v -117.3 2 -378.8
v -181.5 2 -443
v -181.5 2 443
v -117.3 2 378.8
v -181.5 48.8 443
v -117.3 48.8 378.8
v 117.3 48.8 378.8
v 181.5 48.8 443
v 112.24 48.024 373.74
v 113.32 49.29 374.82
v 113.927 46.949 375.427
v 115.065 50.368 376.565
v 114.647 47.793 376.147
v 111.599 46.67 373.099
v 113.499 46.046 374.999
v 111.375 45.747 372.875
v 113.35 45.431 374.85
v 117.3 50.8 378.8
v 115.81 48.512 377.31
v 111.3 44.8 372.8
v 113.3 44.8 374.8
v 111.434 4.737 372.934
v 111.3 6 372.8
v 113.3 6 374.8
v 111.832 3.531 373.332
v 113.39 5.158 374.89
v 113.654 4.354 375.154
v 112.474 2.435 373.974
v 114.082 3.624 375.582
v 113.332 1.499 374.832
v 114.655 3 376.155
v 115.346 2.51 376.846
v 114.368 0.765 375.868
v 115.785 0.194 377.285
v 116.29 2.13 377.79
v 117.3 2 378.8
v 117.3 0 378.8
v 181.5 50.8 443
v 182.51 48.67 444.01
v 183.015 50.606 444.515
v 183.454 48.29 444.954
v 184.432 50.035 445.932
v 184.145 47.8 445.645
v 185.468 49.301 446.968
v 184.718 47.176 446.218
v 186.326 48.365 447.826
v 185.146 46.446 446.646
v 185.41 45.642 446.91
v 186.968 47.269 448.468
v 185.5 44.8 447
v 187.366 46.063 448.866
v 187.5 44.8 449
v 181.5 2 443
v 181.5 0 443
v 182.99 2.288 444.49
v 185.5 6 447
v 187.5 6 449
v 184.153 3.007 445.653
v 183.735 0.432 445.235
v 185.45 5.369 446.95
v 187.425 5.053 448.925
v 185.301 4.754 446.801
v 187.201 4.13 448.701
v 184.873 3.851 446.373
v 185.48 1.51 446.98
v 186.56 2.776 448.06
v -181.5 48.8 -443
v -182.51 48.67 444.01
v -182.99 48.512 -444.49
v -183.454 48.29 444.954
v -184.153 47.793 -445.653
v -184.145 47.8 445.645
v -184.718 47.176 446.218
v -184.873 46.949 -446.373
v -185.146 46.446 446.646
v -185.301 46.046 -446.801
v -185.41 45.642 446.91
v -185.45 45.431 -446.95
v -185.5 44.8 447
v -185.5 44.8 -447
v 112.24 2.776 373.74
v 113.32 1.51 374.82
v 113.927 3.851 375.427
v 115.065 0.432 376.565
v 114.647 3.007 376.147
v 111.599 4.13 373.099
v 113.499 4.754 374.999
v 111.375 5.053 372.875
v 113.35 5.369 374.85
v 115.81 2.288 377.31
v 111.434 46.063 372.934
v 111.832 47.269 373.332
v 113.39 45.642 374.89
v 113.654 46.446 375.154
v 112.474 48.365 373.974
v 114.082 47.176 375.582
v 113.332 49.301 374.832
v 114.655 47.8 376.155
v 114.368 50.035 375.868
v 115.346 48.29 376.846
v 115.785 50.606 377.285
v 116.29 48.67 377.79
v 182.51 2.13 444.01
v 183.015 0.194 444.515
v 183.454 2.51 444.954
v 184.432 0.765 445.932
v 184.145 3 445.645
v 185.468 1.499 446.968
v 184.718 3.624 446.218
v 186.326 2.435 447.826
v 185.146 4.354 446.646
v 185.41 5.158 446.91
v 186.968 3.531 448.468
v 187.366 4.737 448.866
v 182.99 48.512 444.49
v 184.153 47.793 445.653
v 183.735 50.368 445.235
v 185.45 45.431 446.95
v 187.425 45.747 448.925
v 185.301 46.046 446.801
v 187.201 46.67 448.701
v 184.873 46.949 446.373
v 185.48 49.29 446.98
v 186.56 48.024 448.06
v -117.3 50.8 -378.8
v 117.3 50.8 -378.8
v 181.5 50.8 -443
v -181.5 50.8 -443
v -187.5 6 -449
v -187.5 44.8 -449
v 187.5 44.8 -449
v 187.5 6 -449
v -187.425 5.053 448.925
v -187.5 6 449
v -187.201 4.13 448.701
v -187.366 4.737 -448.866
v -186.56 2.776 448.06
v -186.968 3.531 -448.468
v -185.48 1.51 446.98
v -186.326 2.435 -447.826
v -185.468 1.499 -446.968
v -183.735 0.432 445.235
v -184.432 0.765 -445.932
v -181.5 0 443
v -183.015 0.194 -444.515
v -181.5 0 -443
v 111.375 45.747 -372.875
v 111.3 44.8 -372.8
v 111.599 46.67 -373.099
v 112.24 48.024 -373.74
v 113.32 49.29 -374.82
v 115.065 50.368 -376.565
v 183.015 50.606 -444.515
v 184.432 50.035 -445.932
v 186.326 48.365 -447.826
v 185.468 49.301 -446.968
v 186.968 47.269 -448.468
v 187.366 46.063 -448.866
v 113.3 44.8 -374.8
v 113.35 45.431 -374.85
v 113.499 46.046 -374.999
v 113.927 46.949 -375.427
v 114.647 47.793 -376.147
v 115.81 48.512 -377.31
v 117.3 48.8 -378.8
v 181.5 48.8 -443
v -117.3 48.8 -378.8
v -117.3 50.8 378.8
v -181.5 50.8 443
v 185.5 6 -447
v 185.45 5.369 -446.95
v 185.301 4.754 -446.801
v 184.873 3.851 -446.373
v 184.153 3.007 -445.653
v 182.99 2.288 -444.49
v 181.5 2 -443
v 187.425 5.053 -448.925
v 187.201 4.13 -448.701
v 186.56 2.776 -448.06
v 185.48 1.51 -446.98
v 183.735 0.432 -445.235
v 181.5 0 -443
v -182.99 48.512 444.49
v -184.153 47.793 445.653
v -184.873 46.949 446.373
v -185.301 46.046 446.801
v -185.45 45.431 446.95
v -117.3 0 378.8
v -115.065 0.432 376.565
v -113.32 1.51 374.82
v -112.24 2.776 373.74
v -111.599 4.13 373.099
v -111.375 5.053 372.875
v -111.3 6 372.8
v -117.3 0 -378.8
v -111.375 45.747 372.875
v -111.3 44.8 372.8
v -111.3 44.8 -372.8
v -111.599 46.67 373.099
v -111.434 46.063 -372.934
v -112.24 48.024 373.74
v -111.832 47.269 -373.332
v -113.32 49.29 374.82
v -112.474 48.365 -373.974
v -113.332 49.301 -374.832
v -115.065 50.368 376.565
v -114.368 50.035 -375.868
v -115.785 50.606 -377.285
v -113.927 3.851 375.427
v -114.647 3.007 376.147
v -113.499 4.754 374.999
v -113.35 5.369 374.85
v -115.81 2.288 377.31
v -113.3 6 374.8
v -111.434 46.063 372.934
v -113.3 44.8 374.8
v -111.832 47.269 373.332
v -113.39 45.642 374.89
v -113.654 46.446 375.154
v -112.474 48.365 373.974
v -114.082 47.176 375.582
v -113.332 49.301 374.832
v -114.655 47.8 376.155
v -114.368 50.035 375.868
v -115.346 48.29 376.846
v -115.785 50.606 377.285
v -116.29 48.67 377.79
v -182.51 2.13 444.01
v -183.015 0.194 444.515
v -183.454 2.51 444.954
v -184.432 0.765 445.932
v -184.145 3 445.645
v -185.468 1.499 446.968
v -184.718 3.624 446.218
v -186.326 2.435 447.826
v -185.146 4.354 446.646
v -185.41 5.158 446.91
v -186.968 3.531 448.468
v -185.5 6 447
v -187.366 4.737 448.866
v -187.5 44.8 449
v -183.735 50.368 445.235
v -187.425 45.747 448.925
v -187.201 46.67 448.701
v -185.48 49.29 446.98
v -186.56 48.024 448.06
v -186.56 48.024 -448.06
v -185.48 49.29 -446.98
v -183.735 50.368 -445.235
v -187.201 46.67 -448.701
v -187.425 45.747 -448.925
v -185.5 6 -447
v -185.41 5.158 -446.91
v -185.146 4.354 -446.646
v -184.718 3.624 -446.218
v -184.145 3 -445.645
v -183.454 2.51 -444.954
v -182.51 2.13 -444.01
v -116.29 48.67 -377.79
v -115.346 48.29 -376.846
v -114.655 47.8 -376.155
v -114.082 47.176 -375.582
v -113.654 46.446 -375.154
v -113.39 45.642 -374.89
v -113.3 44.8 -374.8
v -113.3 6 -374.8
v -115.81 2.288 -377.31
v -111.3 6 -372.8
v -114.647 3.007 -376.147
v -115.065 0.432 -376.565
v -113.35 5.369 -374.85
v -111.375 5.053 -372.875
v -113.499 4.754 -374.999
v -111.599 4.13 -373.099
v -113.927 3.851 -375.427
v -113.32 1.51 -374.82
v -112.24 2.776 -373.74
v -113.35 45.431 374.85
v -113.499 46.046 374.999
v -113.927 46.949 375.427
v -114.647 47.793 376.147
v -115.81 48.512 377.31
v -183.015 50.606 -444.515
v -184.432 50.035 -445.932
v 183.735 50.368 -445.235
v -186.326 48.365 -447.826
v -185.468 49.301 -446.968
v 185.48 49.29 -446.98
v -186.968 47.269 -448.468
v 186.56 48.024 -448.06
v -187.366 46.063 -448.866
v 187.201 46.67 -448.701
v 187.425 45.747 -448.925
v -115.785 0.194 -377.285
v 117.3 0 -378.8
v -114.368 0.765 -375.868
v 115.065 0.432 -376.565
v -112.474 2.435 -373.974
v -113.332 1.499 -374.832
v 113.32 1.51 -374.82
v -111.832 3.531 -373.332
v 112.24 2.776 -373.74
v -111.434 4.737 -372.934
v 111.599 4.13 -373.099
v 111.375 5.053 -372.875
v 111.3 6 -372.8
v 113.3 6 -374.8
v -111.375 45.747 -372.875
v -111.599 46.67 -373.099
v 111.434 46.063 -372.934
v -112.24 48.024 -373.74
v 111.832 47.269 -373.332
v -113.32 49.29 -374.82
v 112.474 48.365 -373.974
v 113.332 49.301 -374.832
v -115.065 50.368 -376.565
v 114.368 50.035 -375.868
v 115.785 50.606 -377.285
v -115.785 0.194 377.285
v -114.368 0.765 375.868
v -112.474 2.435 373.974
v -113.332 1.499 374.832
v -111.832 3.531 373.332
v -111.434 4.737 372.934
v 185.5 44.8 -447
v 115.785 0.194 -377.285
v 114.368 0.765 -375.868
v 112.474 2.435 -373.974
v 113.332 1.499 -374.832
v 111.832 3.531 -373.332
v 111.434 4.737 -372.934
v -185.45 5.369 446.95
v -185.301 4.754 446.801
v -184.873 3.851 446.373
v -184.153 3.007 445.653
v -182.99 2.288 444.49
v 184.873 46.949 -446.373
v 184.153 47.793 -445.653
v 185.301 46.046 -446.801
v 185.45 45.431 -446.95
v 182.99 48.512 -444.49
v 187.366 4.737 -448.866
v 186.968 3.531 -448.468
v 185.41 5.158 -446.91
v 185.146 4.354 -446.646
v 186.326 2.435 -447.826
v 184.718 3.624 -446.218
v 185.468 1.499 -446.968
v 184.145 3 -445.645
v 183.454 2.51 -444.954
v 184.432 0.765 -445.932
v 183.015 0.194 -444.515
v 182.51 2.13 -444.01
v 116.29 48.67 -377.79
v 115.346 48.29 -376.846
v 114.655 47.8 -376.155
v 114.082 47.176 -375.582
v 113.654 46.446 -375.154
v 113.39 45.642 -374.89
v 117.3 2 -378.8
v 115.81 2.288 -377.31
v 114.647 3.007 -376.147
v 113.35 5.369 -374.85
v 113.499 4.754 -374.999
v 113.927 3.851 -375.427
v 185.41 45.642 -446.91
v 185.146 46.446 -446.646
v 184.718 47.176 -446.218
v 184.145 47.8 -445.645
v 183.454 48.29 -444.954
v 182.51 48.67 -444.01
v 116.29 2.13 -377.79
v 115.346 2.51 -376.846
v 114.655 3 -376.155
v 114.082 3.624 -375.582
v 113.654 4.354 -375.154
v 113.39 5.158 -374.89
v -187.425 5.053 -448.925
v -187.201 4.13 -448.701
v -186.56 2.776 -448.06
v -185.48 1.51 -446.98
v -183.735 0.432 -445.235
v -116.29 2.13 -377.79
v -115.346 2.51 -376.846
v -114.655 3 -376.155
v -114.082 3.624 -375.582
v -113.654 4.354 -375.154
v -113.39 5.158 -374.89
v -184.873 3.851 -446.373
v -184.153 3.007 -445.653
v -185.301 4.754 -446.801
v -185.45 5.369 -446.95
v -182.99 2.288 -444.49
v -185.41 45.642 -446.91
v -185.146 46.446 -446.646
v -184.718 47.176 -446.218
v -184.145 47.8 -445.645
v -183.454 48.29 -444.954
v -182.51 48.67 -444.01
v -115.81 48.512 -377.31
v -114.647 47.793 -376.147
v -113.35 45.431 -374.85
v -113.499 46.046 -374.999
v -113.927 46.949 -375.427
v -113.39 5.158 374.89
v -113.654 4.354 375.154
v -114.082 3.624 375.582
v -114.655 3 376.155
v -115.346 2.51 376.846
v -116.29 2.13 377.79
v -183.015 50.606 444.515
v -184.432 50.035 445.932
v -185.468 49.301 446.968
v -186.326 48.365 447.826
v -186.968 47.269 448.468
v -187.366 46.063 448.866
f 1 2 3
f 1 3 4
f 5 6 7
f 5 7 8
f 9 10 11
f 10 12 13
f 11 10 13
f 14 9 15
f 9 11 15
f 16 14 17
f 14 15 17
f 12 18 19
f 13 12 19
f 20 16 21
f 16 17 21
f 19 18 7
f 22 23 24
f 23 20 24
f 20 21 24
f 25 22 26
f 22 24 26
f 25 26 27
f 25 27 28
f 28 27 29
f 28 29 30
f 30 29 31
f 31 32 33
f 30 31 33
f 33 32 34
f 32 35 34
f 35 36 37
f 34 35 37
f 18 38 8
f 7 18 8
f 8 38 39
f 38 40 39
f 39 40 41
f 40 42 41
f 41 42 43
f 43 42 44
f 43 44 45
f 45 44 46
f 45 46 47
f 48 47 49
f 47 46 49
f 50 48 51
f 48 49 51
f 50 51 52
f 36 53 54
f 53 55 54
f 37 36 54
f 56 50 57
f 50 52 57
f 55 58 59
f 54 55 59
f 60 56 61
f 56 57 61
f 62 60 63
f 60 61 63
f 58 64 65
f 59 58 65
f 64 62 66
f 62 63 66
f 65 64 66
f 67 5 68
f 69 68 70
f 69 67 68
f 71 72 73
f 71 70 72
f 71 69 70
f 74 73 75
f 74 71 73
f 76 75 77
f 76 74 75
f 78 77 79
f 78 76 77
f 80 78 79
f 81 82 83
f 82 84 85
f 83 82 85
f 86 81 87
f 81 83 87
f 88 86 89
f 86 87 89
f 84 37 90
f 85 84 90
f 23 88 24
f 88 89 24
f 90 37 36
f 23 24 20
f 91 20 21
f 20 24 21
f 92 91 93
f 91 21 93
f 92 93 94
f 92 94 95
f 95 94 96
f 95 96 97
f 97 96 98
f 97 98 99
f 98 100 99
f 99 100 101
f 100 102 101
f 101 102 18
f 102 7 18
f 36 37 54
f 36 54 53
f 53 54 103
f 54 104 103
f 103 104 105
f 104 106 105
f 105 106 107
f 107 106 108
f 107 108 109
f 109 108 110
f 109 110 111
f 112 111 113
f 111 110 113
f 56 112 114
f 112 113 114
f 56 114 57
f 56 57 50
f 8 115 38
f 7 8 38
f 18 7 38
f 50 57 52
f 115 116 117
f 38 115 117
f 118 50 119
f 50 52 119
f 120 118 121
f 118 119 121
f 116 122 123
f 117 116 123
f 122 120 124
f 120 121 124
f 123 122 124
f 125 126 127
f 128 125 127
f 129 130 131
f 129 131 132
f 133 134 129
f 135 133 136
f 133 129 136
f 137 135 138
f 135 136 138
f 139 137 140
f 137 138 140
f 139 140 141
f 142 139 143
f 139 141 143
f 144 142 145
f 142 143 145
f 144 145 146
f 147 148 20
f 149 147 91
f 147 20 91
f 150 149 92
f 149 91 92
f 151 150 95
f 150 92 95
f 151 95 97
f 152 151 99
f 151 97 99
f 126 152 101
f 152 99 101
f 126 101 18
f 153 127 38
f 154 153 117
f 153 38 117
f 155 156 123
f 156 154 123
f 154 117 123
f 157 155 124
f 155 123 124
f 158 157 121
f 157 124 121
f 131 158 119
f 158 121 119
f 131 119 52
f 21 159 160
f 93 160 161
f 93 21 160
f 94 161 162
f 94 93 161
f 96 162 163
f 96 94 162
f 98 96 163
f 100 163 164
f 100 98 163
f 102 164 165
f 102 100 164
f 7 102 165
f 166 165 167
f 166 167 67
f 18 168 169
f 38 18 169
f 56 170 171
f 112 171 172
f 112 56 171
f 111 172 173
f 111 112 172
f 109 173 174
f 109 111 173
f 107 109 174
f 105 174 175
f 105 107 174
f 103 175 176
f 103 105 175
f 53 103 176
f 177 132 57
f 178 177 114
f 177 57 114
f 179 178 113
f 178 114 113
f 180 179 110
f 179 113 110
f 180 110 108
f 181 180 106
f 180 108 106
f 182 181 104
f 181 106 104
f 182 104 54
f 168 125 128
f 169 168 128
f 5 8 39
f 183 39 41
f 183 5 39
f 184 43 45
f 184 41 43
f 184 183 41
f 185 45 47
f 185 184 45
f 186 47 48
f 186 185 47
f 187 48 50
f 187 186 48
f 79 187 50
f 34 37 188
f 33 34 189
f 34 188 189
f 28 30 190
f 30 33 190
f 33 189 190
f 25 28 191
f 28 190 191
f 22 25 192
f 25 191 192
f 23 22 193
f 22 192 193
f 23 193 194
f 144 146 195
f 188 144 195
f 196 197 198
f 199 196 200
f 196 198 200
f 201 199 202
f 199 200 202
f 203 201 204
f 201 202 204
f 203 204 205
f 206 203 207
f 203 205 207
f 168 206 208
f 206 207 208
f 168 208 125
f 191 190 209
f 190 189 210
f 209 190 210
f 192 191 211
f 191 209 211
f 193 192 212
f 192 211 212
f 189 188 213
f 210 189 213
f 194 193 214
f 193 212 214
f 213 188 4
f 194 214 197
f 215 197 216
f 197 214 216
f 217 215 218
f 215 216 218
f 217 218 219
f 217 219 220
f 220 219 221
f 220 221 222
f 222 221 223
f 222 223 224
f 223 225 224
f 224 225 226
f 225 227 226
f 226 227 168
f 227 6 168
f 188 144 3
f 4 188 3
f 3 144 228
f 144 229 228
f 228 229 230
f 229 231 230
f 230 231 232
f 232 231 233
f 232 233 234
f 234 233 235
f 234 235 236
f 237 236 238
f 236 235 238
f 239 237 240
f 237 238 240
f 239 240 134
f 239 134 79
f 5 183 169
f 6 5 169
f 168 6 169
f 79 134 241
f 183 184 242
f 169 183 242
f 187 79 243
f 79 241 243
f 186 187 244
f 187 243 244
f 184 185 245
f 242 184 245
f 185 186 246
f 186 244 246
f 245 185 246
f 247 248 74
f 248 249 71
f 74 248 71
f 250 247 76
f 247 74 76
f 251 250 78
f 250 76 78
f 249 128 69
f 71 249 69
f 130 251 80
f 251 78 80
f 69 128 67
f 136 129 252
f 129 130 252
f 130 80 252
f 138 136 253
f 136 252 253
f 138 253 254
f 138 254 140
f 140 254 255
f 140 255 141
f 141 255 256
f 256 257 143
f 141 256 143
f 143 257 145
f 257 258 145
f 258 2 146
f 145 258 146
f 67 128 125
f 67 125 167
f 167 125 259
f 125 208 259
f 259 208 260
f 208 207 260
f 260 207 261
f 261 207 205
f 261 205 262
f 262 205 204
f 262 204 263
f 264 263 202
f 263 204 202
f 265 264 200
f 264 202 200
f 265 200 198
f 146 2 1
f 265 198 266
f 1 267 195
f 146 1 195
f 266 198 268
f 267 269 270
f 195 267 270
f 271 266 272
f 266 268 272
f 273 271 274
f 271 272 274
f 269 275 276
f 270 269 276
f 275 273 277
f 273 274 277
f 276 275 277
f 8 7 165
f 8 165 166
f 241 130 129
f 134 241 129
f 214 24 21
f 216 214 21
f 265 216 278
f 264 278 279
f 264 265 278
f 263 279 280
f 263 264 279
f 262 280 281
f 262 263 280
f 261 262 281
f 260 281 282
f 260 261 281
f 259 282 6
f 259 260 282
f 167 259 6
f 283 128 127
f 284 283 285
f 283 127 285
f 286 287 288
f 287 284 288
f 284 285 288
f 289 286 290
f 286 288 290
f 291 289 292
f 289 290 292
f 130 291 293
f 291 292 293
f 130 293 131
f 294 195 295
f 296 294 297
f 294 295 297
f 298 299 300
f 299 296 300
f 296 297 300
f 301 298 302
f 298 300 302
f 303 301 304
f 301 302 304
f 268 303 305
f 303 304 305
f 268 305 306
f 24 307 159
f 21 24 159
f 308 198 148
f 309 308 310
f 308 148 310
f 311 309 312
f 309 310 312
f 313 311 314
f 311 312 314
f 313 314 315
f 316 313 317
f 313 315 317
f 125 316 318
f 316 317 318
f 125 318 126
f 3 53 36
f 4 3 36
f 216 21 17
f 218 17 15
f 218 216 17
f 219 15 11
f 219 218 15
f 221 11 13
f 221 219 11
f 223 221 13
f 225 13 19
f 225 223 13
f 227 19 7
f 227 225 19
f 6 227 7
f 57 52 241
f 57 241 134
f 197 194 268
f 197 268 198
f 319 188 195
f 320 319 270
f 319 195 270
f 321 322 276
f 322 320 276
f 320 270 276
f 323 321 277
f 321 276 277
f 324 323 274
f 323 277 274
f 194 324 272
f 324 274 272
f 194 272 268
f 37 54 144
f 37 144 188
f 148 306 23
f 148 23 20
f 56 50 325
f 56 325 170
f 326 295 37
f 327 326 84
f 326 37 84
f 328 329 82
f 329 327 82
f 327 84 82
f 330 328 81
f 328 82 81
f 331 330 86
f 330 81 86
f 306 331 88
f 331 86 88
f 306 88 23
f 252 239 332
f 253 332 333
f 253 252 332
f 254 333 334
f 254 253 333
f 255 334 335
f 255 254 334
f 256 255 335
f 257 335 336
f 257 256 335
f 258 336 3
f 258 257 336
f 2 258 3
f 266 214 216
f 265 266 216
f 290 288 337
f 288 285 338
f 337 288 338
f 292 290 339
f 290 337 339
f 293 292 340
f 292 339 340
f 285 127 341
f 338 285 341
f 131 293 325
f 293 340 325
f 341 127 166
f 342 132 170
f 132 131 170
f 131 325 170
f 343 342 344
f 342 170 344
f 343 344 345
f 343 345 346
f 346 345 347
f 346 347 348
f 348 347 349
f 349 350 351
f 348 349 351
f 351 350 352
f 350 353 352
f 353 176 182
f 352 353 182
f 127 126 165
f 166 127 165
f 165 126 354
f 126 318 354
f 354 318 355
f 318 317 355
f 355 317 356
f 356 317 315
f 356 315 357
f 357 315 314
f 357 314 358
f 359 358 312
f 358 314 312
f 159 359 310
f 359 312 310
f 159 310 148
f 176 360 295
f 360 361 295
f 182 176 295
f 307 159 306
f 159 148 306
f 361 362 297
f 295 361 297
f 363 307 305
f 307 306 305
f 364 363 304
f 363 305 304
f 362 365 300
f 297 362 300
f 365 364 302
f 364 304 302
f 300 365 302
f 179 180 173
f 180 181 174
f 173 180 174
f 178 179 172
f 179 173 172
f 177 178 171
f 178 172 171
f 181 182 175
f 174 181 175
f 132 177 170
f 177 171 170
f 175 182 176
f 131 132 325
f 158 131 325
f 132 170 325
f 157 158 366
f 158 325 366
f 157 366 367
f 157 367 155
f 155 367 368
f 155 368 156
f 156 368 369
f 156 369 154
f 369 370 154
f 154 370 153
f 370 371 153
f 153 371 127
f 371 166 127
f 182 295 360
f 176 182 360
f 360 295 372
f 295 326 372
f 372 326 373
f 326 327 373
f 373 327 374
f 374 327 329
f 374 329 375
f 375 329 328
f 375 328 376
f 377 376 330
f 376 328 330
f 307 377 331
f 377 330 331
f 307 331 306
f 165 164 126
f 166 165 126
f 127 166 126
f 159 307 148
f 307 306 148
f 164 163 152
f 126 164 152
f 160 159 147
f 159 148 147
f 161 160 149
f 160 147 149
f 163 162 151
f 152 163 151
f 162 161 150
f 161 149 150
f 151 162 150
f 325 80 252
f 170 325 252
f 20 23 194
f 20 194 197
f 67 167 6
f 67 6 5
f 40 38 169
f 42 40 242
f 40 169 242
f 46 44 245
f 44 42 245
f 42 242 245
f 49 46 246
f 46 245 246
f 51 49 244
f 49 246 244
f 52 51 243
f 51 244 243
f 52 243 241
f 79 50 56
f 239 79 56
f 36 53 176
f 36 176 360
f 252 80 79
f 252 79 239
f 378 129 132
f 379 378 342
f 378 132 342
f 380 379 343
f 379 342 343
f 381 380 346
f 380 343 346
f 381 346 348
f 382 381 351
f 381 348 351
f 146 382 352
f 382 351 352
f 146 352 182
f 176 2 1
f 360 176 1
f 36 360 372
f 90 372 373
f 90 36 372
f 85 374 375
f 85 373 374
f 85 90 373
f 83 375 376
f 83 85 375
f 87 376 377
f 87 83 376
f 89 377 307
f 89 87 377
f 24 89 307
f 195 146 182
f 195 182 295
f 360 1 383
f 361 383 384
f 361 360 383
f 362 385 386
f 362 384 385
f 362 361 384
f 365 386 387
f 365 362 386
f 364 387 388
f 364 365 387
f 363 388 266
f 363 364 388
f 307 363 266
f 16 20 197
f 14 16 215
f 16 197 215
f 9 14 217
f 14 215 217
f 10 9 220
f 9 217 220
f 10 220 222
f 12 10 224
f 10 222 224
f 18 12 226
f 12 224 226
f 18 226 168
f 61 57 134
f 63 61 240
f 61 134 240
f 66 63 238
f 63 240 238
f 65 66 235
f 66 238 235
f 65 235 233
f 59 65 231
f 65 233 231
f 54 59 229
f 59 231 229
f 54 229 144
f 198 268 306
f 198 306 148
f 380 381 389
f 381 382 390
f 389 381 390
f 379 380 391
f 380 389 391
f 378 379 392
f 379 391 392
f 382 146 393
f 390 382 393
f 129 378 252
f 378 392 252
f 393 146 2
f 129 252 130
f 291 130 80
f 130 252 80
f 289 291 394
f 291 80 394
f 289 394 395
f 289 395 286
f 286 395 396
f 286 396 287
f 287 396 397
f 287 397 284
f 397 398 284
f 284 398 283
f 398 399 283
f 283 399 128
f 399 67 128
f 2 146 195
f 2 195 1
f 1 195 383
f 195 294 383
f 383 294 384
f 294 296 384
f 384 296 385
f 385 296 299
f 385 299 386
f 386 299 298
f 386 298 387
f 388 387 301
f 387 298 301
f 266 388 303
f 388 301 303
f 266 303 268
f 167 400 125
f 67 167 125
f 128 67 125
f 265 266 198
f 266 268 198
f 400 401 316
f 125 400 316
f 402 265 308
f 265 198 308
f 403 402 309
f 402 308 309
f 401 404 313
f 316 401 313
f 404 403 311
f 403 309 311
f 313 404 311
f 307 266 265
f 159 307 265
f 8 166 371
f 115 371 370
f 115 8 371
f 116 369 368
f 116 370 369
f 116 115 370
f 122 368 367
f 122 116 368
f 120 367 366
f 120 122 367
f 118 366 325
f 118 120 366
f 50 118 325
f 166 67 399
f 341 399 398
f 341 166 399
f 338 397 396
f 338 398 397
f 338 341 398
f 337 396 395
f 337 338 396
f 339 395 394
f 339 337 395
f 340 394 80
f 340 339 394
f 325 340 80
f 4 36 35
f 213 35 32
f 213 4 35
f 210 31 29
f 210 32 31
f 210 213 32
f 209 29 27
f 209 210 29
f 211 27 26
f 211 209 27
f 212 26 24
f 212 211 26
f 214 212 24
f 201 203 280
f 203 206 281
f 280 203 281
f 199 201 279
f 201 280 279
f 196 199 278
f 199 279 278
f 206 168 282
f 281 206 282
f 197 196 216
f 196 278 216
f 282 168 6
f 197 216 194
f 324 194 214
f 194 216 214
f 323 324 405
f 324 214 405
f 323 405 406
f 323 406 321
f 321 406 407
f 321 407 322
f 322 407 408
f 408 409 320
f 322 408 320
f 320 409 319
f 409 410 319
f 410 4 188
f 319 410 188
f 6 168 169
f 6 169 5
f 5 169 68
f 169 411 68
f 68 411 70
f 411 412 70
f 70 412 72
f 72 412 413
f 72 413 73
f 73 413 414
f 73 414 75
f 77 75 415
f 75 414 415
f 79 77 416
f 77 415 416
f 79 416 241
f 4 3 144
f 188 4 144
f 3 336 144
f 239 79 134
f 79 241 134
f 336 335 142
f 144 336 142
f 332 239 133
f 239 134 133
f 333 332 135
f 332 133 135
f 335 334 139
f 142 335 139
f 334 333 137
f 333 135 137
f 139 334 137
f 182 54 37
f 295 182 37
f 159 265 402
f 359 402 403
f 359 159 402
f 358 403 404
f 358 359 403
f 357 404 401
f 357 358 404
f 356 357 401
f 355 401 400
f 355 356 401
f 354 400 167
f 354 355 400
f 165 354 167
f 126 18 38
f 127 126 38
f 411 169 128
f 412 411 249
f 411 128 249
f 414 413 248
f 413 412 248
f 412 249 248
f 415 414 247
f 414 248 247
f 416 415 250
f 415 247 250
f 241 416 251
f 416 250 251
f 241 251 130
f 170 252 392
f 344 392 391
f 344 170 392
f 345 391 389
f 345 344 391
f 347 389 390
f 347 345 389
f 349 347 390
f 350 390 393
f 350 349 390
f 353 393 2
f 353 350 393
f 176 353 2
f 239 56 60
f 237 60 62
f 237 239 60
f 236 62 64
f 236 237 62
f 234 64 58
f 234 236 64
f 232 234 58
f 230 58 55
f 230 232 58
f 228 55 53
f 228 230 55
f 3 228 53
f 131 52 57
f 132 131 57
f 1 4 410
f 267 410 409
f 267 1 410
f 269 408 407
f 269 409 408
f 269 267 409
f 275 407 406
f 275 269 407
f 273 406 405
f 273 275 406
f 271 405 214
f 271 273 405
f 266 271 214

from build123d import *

# Parameters (mm, degrees)
TUBO_RECTANGULAR_3_X_2_X_0_25_1_DEPTH      = 990.581002397
TUBO_RECTANGULAR_3_X_2_X_0_25_1_DEPTH_BACK = 92.581002397
TUBO_RECTANGULAR_3_X_2_X_0_25_1_2_DEPTH    = 560.162004794
TUBO_RECTANGULAR_3_X_2_X_0_25_1_3_DEPTH    = 1083.162004794
TUBO_RECTANGULAR_3_X_2_X_0_25_1_4_DEPTH    = 560.162004794


with BuildPart() as part:
    # Sketch1 → Tubo rectangular 3 X 2 X 0.25(1) (new, two sides: drawn at the far end of the back side and taken through both)
    with BuildSketch(Plane(origin=(-149.4, 25.4, -449), x_dir=(1, 0, 0), z_dir=(0, 0, 1)).offset(-TUBO_RECTANGULAR_3_X_2_X_0_25_1_DEPTH_BACK)):
        with BuildLine():
            Line((-32.1, -25.4), (32.1, -25.4))
            ThreePointArc((32.1, -25.4), (36.342640687, -23.642640687), (38.1, -19.4))
            Line((38.1, -19.4), (38.1, 19.4))
            ThreePointArc((38.1, 19.4), (36.342640687, 23.642640687), (32.1, 25.4))
            Line((32.1, 25.4), (-32.1, 25.4))
            ThreePointArc((-32.1, 25.4), (-36.342640687, 23.642640687), (-38.1, 19.4))
            Line((-38.1, 19.4), (-38.1, -19.4))
            ThreePointArc((-38.1, -19.4), (-36.342640687, -23.642640687), (-32.1, -25.4))
        make_face()
        with BuildLine():
            Line((-32.1, -23.4), (32.1, -23.4))
            ThreePointArc((32.1, -23.4), (34.928427125, -22.228427125), (36.1, -19.4))
            Line((36.1, -19.4), (36.1, 19.4))
            ThreePointArc((36.1, 19.4), (34.928427125, 22.228427125), (32.1, 23.4))
            Line((32.1, 23.4), (-32.1, 23.4))
            ThreePointArc((-32.1, 23.4), (-34.928427125, 22.228427125), (-36.1, 19.4))
            Line((-36.1, 19.4), (-36.1, -19.4))
            ThreePointArc((-36.1, -19.4), (-34.928427125, -22.228427125), (-32.1, -23.4))
        make_face(mode=Mode.SUBTRACT)
    extrude(amount=TUBO_RECTANGULAR_3_X_2_X_0_25_1_DEPTH + TUBO_RECTANGULAR_3_X_2_X_0_25_1_DEPTH_BACK)

    # Tubo rectangular 3 X 2 X 0.25(1) mitre 1
    split(bisect_by=Plane(origin=(-187.5, 0, -449), x_dir=(0, -1, 0), z_dir=(-0.707106781, 0, 0.707106781)), keep=Keep.TOP)

    # Tubo rectangular 3 X 2 X 0.25(1) mitre 2
    split(bisect_by=Plane(origin=(-187.5, 0, 449), x_dir=(0, -1, 0), z_dir=(-0.707106781, 0, -0.707106781)), keep=Keep.TOP)


with BuildPart() as body_2:
    # Sketch1 on segment 2 (carried to segment 2) → Tubo rectangular 3 X 2 X 0.25_1 2 (new body)
    with BuildSketch(Plane(origin=(-280.081002397, 25.4, 410.9), x_dir=(0, 0, -1), z_dir=(1, 0, 0))):
        with BuildLine():
            Line((-32.1, -25.4), (32.1, -25.4))
            ThreePointArc((32.1, -25.4), (36.342640687, -23.642640687), (38.1, -19.4))
            Line((38.1, -19.4), (38.1, 19.4))
            ThreePointArc((38.1, 19.4), (36.342640687, 23.642640687), (32.1, 25.4))
            Line((32.1, 25.4), (-32.1, 25.4))
            ThreePointArc((-32.1, 25.4), (-36.342640687, 23.642640687), (-38.1, 19.4))
            Line((-38.1, 19.4), (-38.1, -19.4))
            ThreePointArc((-38.1, -19.4), (-36.342640687, -23.642640687), (-32.1, -25.4))
        make_face()
        with BuildLine():
            Line((-32.1, -23.4), (32.1, -23.4))
            ThreePointArc((32.1, -23.4), (34.928427125, -22.228427125), (36.1, -19.4))
            Line((36.1, -19.4), (36.1, 19.4))
            ThreePointArc((36.1, 19.4), (34.928427125, 22.228427125), (32.1, 23.4))
            Line((32.1, 23.4), (-32.1, 23.4))
            ThreePointArc((-32.1, 23.4), (-34.928427125, 22.228427125), (-36.1, 19.4))
            Line((-36.1, 19.4), (-36.1, -19.4))
            ThreePointArc((-36.1, -19.4), (-34.928427125, -22.228427125), (-32.1, -23.4))
        make_face(mode=Mode.SUBTRACT)
    extrude(amount=TUBO_RECTANGULAR_3_X_2_X_0_25_1_2_DEPTH)

    # Tubo rectangular 3 X 2 X 0.25_1 2 mitre
    split(bisect_by=Plane(origin=(-187.5, 0, 449), x_dir=(0, 1, 0), z_dir=(0.707106781, 0, 0.707106781)), keep=Keep.TOP)

    # Tubo rectangular 3 X 2 X 0.25_1 2 mi 2
    split(bisect_by=Plane(origin=(187.5, 0, 449), x_dir=(0, -1, 0), z_dir=(-0.707106781, 0, 0.707106781)), keep=Keep.TOP)


with BuildPart() as body_3:
    # Sketch1 on segment 3 (carried to segment 3) → Tubo rectangular 3 X 2 X 0.25_1 3 (new body)
    with BuildSketch(Plane(origin=(149.4, 25.4, 541.581002397), x_dir=(-1, 0, 0), z_dir=(0, 0, -1))):
        with BuildLine():
            Line((-32.1, -25.4), (32.1, -25.4))
            ThreePointArc((32.1, -25.4), (36.342640687, -23.642640687), (38.1, -19.4))
            Line((38.1, -19.4), (38.1, 19.4))
            ThreePointArc((38.1, 19.4), (36.342640687, 23.642640687), (32.1, 25.4))
            Line((32.1, 25.4), (-32.1, 25.4))
            ThreePointArc((-32.1, 25.4), (-36.342640687, 23.642640687), (-38.1, 19.4))
            Line((-38.1, 19.4), (-38.1, -19.4))
            ThreePointArc((-38.1, -19.4), (-36.342640687, -23.642640687), (-32.1, -25.4))
        make_face()
        with BuildLine():
            Line((-32.1, -23.4), (32.1, -23.4))
            ThreePointArc((32.1, -23.4), (34.928427125, -22.228427125), (36.1, -19.4))
            Line((36.1, -19.4), (36.1, 19.4))
            ThreePointArc((36.1, 19.4), (34.928427125, 22.228427125), (32.1, 23.4))
            Line((32.1, 23.4), (-32.1, 23.4))
            ThreePointArc((-32.1, 23.4), (-34.928427125, 22.228427125), (-36.1, 19.4))
            Line((-36.1, 19.4), (-36.1, -19.4))
            ThreePointArc((-36.1, -19.4), (-34.928427125, -22.228427125), (-32.1, -23.4))
        make_face(mode=Mode.SUBTRACT)
    extrude(amount=TUBO_RECTANGULAR_3_X_2_X_0_25_1_3_DEPTH)

    # Tubo rectangular 3 X 2 X 0.25_1 3 mitre
    split(bisect_by=Plane(origin=(187.5, 0, -449), x_dir=(0, 1, 0), z_dir=(0.707106781, 0, 0.707106781)), keep=Keep.TOP)

    # Tubo rectangular 3 X 2 X 0.25_1 3 mi 2
    split(bisect_by=Plane(origin=(187.5, 0, 449), x_dir=(0, 1, 0), z_dir=(0.707106781, 0, -0.707106781)), keep=Keep.TOP)


with BuildPart() as body_4:
    # Sketch1 on segment 4 (carried to segment 4) → Tubo rectangular 3 X 2 X 0.25_1 4 (new body)
    with BuildSketch(Plane(origin=(280.081002397, 25.4, -410.9), x_dir=(0, 0, 1), z_dir=(-1, 0, 0))):
        with BuildLine():
            Line((-32.1, -25.4), (32.1, -25.4))
            ThreePointArc((32.1, -25.4), (36.342640687, -23.642640687), (38.1, -19.4))
            Line((38.1, -19.4), (38.1, 19.4))
            ThreePointArc((38.1, 19.4), (36.342640687, 23.642640687), (32.1, 25.4))
            Line((32.1, 25.4), (-32.1, 25.4))
            ThreePointArc((-32.1, 25.4), (-36.342640687, 23.642640687), (-38.1, 19.4))
            Line((-38.1, 19.4), (-38.1, -19.4))
            ThreePointArc((-38.1, -19.4), (-36.342640687, -23.642640687), (-32.1, -25.4))
        make_face()
        with BuildLine():
            Line((-32.1, -23.4), (32.1, -23.4))
            ThreePointArc((32.1, -23.4), (34.928427125, -22.228427125), (36.1, -19.4))
            Line((36.1, -19.4), (36.1, 19.4))
            ThreePointArc((36.1, 19.4), (34.928427125, 22.228427125), (32.1, 23.4))
            Line((32.1, 23.4), (-32.1, 23.4))
            ThreePointArc((-32.1, 23.4), (-34.928427125, 22.228427125), (-36.1, 19.4))
            Line((-36.1, 19.4), (-36.1, -19.4))
            ThreePointArc((-36.1, -19.4), (-34.928427125, -22.228427125), (-32.1, -23.4))
        make_face(mode=Mode.SUBTRACT)
    extrude(amount=TUBO_RECTANGULAR_3_X_2_X_0_25_1_4_DEPTH)

    # Tubo rectangular 3 X 2 X 0.25_1 4 mitre
    split(bisect_by=Plane(origin=(-187.5, 0, -449), x_dir=(0, 1, 0), z_dir=(0.707106781, 0, -0.707106781)), keep=Keep.TOP)

    # Tubo rectangular 3 X 2 X 0.25_1 4 mi 2
    split(bisect_by=Plane(origin=(187.5, 0, -449), x_dir=(0, -1, 0), z_dir=(-0.707106781, 0, -0.707106781)), keep=Keep.TOP)


solid = Compound([part.part, body_2.part, body_3.part, body_4.part])
